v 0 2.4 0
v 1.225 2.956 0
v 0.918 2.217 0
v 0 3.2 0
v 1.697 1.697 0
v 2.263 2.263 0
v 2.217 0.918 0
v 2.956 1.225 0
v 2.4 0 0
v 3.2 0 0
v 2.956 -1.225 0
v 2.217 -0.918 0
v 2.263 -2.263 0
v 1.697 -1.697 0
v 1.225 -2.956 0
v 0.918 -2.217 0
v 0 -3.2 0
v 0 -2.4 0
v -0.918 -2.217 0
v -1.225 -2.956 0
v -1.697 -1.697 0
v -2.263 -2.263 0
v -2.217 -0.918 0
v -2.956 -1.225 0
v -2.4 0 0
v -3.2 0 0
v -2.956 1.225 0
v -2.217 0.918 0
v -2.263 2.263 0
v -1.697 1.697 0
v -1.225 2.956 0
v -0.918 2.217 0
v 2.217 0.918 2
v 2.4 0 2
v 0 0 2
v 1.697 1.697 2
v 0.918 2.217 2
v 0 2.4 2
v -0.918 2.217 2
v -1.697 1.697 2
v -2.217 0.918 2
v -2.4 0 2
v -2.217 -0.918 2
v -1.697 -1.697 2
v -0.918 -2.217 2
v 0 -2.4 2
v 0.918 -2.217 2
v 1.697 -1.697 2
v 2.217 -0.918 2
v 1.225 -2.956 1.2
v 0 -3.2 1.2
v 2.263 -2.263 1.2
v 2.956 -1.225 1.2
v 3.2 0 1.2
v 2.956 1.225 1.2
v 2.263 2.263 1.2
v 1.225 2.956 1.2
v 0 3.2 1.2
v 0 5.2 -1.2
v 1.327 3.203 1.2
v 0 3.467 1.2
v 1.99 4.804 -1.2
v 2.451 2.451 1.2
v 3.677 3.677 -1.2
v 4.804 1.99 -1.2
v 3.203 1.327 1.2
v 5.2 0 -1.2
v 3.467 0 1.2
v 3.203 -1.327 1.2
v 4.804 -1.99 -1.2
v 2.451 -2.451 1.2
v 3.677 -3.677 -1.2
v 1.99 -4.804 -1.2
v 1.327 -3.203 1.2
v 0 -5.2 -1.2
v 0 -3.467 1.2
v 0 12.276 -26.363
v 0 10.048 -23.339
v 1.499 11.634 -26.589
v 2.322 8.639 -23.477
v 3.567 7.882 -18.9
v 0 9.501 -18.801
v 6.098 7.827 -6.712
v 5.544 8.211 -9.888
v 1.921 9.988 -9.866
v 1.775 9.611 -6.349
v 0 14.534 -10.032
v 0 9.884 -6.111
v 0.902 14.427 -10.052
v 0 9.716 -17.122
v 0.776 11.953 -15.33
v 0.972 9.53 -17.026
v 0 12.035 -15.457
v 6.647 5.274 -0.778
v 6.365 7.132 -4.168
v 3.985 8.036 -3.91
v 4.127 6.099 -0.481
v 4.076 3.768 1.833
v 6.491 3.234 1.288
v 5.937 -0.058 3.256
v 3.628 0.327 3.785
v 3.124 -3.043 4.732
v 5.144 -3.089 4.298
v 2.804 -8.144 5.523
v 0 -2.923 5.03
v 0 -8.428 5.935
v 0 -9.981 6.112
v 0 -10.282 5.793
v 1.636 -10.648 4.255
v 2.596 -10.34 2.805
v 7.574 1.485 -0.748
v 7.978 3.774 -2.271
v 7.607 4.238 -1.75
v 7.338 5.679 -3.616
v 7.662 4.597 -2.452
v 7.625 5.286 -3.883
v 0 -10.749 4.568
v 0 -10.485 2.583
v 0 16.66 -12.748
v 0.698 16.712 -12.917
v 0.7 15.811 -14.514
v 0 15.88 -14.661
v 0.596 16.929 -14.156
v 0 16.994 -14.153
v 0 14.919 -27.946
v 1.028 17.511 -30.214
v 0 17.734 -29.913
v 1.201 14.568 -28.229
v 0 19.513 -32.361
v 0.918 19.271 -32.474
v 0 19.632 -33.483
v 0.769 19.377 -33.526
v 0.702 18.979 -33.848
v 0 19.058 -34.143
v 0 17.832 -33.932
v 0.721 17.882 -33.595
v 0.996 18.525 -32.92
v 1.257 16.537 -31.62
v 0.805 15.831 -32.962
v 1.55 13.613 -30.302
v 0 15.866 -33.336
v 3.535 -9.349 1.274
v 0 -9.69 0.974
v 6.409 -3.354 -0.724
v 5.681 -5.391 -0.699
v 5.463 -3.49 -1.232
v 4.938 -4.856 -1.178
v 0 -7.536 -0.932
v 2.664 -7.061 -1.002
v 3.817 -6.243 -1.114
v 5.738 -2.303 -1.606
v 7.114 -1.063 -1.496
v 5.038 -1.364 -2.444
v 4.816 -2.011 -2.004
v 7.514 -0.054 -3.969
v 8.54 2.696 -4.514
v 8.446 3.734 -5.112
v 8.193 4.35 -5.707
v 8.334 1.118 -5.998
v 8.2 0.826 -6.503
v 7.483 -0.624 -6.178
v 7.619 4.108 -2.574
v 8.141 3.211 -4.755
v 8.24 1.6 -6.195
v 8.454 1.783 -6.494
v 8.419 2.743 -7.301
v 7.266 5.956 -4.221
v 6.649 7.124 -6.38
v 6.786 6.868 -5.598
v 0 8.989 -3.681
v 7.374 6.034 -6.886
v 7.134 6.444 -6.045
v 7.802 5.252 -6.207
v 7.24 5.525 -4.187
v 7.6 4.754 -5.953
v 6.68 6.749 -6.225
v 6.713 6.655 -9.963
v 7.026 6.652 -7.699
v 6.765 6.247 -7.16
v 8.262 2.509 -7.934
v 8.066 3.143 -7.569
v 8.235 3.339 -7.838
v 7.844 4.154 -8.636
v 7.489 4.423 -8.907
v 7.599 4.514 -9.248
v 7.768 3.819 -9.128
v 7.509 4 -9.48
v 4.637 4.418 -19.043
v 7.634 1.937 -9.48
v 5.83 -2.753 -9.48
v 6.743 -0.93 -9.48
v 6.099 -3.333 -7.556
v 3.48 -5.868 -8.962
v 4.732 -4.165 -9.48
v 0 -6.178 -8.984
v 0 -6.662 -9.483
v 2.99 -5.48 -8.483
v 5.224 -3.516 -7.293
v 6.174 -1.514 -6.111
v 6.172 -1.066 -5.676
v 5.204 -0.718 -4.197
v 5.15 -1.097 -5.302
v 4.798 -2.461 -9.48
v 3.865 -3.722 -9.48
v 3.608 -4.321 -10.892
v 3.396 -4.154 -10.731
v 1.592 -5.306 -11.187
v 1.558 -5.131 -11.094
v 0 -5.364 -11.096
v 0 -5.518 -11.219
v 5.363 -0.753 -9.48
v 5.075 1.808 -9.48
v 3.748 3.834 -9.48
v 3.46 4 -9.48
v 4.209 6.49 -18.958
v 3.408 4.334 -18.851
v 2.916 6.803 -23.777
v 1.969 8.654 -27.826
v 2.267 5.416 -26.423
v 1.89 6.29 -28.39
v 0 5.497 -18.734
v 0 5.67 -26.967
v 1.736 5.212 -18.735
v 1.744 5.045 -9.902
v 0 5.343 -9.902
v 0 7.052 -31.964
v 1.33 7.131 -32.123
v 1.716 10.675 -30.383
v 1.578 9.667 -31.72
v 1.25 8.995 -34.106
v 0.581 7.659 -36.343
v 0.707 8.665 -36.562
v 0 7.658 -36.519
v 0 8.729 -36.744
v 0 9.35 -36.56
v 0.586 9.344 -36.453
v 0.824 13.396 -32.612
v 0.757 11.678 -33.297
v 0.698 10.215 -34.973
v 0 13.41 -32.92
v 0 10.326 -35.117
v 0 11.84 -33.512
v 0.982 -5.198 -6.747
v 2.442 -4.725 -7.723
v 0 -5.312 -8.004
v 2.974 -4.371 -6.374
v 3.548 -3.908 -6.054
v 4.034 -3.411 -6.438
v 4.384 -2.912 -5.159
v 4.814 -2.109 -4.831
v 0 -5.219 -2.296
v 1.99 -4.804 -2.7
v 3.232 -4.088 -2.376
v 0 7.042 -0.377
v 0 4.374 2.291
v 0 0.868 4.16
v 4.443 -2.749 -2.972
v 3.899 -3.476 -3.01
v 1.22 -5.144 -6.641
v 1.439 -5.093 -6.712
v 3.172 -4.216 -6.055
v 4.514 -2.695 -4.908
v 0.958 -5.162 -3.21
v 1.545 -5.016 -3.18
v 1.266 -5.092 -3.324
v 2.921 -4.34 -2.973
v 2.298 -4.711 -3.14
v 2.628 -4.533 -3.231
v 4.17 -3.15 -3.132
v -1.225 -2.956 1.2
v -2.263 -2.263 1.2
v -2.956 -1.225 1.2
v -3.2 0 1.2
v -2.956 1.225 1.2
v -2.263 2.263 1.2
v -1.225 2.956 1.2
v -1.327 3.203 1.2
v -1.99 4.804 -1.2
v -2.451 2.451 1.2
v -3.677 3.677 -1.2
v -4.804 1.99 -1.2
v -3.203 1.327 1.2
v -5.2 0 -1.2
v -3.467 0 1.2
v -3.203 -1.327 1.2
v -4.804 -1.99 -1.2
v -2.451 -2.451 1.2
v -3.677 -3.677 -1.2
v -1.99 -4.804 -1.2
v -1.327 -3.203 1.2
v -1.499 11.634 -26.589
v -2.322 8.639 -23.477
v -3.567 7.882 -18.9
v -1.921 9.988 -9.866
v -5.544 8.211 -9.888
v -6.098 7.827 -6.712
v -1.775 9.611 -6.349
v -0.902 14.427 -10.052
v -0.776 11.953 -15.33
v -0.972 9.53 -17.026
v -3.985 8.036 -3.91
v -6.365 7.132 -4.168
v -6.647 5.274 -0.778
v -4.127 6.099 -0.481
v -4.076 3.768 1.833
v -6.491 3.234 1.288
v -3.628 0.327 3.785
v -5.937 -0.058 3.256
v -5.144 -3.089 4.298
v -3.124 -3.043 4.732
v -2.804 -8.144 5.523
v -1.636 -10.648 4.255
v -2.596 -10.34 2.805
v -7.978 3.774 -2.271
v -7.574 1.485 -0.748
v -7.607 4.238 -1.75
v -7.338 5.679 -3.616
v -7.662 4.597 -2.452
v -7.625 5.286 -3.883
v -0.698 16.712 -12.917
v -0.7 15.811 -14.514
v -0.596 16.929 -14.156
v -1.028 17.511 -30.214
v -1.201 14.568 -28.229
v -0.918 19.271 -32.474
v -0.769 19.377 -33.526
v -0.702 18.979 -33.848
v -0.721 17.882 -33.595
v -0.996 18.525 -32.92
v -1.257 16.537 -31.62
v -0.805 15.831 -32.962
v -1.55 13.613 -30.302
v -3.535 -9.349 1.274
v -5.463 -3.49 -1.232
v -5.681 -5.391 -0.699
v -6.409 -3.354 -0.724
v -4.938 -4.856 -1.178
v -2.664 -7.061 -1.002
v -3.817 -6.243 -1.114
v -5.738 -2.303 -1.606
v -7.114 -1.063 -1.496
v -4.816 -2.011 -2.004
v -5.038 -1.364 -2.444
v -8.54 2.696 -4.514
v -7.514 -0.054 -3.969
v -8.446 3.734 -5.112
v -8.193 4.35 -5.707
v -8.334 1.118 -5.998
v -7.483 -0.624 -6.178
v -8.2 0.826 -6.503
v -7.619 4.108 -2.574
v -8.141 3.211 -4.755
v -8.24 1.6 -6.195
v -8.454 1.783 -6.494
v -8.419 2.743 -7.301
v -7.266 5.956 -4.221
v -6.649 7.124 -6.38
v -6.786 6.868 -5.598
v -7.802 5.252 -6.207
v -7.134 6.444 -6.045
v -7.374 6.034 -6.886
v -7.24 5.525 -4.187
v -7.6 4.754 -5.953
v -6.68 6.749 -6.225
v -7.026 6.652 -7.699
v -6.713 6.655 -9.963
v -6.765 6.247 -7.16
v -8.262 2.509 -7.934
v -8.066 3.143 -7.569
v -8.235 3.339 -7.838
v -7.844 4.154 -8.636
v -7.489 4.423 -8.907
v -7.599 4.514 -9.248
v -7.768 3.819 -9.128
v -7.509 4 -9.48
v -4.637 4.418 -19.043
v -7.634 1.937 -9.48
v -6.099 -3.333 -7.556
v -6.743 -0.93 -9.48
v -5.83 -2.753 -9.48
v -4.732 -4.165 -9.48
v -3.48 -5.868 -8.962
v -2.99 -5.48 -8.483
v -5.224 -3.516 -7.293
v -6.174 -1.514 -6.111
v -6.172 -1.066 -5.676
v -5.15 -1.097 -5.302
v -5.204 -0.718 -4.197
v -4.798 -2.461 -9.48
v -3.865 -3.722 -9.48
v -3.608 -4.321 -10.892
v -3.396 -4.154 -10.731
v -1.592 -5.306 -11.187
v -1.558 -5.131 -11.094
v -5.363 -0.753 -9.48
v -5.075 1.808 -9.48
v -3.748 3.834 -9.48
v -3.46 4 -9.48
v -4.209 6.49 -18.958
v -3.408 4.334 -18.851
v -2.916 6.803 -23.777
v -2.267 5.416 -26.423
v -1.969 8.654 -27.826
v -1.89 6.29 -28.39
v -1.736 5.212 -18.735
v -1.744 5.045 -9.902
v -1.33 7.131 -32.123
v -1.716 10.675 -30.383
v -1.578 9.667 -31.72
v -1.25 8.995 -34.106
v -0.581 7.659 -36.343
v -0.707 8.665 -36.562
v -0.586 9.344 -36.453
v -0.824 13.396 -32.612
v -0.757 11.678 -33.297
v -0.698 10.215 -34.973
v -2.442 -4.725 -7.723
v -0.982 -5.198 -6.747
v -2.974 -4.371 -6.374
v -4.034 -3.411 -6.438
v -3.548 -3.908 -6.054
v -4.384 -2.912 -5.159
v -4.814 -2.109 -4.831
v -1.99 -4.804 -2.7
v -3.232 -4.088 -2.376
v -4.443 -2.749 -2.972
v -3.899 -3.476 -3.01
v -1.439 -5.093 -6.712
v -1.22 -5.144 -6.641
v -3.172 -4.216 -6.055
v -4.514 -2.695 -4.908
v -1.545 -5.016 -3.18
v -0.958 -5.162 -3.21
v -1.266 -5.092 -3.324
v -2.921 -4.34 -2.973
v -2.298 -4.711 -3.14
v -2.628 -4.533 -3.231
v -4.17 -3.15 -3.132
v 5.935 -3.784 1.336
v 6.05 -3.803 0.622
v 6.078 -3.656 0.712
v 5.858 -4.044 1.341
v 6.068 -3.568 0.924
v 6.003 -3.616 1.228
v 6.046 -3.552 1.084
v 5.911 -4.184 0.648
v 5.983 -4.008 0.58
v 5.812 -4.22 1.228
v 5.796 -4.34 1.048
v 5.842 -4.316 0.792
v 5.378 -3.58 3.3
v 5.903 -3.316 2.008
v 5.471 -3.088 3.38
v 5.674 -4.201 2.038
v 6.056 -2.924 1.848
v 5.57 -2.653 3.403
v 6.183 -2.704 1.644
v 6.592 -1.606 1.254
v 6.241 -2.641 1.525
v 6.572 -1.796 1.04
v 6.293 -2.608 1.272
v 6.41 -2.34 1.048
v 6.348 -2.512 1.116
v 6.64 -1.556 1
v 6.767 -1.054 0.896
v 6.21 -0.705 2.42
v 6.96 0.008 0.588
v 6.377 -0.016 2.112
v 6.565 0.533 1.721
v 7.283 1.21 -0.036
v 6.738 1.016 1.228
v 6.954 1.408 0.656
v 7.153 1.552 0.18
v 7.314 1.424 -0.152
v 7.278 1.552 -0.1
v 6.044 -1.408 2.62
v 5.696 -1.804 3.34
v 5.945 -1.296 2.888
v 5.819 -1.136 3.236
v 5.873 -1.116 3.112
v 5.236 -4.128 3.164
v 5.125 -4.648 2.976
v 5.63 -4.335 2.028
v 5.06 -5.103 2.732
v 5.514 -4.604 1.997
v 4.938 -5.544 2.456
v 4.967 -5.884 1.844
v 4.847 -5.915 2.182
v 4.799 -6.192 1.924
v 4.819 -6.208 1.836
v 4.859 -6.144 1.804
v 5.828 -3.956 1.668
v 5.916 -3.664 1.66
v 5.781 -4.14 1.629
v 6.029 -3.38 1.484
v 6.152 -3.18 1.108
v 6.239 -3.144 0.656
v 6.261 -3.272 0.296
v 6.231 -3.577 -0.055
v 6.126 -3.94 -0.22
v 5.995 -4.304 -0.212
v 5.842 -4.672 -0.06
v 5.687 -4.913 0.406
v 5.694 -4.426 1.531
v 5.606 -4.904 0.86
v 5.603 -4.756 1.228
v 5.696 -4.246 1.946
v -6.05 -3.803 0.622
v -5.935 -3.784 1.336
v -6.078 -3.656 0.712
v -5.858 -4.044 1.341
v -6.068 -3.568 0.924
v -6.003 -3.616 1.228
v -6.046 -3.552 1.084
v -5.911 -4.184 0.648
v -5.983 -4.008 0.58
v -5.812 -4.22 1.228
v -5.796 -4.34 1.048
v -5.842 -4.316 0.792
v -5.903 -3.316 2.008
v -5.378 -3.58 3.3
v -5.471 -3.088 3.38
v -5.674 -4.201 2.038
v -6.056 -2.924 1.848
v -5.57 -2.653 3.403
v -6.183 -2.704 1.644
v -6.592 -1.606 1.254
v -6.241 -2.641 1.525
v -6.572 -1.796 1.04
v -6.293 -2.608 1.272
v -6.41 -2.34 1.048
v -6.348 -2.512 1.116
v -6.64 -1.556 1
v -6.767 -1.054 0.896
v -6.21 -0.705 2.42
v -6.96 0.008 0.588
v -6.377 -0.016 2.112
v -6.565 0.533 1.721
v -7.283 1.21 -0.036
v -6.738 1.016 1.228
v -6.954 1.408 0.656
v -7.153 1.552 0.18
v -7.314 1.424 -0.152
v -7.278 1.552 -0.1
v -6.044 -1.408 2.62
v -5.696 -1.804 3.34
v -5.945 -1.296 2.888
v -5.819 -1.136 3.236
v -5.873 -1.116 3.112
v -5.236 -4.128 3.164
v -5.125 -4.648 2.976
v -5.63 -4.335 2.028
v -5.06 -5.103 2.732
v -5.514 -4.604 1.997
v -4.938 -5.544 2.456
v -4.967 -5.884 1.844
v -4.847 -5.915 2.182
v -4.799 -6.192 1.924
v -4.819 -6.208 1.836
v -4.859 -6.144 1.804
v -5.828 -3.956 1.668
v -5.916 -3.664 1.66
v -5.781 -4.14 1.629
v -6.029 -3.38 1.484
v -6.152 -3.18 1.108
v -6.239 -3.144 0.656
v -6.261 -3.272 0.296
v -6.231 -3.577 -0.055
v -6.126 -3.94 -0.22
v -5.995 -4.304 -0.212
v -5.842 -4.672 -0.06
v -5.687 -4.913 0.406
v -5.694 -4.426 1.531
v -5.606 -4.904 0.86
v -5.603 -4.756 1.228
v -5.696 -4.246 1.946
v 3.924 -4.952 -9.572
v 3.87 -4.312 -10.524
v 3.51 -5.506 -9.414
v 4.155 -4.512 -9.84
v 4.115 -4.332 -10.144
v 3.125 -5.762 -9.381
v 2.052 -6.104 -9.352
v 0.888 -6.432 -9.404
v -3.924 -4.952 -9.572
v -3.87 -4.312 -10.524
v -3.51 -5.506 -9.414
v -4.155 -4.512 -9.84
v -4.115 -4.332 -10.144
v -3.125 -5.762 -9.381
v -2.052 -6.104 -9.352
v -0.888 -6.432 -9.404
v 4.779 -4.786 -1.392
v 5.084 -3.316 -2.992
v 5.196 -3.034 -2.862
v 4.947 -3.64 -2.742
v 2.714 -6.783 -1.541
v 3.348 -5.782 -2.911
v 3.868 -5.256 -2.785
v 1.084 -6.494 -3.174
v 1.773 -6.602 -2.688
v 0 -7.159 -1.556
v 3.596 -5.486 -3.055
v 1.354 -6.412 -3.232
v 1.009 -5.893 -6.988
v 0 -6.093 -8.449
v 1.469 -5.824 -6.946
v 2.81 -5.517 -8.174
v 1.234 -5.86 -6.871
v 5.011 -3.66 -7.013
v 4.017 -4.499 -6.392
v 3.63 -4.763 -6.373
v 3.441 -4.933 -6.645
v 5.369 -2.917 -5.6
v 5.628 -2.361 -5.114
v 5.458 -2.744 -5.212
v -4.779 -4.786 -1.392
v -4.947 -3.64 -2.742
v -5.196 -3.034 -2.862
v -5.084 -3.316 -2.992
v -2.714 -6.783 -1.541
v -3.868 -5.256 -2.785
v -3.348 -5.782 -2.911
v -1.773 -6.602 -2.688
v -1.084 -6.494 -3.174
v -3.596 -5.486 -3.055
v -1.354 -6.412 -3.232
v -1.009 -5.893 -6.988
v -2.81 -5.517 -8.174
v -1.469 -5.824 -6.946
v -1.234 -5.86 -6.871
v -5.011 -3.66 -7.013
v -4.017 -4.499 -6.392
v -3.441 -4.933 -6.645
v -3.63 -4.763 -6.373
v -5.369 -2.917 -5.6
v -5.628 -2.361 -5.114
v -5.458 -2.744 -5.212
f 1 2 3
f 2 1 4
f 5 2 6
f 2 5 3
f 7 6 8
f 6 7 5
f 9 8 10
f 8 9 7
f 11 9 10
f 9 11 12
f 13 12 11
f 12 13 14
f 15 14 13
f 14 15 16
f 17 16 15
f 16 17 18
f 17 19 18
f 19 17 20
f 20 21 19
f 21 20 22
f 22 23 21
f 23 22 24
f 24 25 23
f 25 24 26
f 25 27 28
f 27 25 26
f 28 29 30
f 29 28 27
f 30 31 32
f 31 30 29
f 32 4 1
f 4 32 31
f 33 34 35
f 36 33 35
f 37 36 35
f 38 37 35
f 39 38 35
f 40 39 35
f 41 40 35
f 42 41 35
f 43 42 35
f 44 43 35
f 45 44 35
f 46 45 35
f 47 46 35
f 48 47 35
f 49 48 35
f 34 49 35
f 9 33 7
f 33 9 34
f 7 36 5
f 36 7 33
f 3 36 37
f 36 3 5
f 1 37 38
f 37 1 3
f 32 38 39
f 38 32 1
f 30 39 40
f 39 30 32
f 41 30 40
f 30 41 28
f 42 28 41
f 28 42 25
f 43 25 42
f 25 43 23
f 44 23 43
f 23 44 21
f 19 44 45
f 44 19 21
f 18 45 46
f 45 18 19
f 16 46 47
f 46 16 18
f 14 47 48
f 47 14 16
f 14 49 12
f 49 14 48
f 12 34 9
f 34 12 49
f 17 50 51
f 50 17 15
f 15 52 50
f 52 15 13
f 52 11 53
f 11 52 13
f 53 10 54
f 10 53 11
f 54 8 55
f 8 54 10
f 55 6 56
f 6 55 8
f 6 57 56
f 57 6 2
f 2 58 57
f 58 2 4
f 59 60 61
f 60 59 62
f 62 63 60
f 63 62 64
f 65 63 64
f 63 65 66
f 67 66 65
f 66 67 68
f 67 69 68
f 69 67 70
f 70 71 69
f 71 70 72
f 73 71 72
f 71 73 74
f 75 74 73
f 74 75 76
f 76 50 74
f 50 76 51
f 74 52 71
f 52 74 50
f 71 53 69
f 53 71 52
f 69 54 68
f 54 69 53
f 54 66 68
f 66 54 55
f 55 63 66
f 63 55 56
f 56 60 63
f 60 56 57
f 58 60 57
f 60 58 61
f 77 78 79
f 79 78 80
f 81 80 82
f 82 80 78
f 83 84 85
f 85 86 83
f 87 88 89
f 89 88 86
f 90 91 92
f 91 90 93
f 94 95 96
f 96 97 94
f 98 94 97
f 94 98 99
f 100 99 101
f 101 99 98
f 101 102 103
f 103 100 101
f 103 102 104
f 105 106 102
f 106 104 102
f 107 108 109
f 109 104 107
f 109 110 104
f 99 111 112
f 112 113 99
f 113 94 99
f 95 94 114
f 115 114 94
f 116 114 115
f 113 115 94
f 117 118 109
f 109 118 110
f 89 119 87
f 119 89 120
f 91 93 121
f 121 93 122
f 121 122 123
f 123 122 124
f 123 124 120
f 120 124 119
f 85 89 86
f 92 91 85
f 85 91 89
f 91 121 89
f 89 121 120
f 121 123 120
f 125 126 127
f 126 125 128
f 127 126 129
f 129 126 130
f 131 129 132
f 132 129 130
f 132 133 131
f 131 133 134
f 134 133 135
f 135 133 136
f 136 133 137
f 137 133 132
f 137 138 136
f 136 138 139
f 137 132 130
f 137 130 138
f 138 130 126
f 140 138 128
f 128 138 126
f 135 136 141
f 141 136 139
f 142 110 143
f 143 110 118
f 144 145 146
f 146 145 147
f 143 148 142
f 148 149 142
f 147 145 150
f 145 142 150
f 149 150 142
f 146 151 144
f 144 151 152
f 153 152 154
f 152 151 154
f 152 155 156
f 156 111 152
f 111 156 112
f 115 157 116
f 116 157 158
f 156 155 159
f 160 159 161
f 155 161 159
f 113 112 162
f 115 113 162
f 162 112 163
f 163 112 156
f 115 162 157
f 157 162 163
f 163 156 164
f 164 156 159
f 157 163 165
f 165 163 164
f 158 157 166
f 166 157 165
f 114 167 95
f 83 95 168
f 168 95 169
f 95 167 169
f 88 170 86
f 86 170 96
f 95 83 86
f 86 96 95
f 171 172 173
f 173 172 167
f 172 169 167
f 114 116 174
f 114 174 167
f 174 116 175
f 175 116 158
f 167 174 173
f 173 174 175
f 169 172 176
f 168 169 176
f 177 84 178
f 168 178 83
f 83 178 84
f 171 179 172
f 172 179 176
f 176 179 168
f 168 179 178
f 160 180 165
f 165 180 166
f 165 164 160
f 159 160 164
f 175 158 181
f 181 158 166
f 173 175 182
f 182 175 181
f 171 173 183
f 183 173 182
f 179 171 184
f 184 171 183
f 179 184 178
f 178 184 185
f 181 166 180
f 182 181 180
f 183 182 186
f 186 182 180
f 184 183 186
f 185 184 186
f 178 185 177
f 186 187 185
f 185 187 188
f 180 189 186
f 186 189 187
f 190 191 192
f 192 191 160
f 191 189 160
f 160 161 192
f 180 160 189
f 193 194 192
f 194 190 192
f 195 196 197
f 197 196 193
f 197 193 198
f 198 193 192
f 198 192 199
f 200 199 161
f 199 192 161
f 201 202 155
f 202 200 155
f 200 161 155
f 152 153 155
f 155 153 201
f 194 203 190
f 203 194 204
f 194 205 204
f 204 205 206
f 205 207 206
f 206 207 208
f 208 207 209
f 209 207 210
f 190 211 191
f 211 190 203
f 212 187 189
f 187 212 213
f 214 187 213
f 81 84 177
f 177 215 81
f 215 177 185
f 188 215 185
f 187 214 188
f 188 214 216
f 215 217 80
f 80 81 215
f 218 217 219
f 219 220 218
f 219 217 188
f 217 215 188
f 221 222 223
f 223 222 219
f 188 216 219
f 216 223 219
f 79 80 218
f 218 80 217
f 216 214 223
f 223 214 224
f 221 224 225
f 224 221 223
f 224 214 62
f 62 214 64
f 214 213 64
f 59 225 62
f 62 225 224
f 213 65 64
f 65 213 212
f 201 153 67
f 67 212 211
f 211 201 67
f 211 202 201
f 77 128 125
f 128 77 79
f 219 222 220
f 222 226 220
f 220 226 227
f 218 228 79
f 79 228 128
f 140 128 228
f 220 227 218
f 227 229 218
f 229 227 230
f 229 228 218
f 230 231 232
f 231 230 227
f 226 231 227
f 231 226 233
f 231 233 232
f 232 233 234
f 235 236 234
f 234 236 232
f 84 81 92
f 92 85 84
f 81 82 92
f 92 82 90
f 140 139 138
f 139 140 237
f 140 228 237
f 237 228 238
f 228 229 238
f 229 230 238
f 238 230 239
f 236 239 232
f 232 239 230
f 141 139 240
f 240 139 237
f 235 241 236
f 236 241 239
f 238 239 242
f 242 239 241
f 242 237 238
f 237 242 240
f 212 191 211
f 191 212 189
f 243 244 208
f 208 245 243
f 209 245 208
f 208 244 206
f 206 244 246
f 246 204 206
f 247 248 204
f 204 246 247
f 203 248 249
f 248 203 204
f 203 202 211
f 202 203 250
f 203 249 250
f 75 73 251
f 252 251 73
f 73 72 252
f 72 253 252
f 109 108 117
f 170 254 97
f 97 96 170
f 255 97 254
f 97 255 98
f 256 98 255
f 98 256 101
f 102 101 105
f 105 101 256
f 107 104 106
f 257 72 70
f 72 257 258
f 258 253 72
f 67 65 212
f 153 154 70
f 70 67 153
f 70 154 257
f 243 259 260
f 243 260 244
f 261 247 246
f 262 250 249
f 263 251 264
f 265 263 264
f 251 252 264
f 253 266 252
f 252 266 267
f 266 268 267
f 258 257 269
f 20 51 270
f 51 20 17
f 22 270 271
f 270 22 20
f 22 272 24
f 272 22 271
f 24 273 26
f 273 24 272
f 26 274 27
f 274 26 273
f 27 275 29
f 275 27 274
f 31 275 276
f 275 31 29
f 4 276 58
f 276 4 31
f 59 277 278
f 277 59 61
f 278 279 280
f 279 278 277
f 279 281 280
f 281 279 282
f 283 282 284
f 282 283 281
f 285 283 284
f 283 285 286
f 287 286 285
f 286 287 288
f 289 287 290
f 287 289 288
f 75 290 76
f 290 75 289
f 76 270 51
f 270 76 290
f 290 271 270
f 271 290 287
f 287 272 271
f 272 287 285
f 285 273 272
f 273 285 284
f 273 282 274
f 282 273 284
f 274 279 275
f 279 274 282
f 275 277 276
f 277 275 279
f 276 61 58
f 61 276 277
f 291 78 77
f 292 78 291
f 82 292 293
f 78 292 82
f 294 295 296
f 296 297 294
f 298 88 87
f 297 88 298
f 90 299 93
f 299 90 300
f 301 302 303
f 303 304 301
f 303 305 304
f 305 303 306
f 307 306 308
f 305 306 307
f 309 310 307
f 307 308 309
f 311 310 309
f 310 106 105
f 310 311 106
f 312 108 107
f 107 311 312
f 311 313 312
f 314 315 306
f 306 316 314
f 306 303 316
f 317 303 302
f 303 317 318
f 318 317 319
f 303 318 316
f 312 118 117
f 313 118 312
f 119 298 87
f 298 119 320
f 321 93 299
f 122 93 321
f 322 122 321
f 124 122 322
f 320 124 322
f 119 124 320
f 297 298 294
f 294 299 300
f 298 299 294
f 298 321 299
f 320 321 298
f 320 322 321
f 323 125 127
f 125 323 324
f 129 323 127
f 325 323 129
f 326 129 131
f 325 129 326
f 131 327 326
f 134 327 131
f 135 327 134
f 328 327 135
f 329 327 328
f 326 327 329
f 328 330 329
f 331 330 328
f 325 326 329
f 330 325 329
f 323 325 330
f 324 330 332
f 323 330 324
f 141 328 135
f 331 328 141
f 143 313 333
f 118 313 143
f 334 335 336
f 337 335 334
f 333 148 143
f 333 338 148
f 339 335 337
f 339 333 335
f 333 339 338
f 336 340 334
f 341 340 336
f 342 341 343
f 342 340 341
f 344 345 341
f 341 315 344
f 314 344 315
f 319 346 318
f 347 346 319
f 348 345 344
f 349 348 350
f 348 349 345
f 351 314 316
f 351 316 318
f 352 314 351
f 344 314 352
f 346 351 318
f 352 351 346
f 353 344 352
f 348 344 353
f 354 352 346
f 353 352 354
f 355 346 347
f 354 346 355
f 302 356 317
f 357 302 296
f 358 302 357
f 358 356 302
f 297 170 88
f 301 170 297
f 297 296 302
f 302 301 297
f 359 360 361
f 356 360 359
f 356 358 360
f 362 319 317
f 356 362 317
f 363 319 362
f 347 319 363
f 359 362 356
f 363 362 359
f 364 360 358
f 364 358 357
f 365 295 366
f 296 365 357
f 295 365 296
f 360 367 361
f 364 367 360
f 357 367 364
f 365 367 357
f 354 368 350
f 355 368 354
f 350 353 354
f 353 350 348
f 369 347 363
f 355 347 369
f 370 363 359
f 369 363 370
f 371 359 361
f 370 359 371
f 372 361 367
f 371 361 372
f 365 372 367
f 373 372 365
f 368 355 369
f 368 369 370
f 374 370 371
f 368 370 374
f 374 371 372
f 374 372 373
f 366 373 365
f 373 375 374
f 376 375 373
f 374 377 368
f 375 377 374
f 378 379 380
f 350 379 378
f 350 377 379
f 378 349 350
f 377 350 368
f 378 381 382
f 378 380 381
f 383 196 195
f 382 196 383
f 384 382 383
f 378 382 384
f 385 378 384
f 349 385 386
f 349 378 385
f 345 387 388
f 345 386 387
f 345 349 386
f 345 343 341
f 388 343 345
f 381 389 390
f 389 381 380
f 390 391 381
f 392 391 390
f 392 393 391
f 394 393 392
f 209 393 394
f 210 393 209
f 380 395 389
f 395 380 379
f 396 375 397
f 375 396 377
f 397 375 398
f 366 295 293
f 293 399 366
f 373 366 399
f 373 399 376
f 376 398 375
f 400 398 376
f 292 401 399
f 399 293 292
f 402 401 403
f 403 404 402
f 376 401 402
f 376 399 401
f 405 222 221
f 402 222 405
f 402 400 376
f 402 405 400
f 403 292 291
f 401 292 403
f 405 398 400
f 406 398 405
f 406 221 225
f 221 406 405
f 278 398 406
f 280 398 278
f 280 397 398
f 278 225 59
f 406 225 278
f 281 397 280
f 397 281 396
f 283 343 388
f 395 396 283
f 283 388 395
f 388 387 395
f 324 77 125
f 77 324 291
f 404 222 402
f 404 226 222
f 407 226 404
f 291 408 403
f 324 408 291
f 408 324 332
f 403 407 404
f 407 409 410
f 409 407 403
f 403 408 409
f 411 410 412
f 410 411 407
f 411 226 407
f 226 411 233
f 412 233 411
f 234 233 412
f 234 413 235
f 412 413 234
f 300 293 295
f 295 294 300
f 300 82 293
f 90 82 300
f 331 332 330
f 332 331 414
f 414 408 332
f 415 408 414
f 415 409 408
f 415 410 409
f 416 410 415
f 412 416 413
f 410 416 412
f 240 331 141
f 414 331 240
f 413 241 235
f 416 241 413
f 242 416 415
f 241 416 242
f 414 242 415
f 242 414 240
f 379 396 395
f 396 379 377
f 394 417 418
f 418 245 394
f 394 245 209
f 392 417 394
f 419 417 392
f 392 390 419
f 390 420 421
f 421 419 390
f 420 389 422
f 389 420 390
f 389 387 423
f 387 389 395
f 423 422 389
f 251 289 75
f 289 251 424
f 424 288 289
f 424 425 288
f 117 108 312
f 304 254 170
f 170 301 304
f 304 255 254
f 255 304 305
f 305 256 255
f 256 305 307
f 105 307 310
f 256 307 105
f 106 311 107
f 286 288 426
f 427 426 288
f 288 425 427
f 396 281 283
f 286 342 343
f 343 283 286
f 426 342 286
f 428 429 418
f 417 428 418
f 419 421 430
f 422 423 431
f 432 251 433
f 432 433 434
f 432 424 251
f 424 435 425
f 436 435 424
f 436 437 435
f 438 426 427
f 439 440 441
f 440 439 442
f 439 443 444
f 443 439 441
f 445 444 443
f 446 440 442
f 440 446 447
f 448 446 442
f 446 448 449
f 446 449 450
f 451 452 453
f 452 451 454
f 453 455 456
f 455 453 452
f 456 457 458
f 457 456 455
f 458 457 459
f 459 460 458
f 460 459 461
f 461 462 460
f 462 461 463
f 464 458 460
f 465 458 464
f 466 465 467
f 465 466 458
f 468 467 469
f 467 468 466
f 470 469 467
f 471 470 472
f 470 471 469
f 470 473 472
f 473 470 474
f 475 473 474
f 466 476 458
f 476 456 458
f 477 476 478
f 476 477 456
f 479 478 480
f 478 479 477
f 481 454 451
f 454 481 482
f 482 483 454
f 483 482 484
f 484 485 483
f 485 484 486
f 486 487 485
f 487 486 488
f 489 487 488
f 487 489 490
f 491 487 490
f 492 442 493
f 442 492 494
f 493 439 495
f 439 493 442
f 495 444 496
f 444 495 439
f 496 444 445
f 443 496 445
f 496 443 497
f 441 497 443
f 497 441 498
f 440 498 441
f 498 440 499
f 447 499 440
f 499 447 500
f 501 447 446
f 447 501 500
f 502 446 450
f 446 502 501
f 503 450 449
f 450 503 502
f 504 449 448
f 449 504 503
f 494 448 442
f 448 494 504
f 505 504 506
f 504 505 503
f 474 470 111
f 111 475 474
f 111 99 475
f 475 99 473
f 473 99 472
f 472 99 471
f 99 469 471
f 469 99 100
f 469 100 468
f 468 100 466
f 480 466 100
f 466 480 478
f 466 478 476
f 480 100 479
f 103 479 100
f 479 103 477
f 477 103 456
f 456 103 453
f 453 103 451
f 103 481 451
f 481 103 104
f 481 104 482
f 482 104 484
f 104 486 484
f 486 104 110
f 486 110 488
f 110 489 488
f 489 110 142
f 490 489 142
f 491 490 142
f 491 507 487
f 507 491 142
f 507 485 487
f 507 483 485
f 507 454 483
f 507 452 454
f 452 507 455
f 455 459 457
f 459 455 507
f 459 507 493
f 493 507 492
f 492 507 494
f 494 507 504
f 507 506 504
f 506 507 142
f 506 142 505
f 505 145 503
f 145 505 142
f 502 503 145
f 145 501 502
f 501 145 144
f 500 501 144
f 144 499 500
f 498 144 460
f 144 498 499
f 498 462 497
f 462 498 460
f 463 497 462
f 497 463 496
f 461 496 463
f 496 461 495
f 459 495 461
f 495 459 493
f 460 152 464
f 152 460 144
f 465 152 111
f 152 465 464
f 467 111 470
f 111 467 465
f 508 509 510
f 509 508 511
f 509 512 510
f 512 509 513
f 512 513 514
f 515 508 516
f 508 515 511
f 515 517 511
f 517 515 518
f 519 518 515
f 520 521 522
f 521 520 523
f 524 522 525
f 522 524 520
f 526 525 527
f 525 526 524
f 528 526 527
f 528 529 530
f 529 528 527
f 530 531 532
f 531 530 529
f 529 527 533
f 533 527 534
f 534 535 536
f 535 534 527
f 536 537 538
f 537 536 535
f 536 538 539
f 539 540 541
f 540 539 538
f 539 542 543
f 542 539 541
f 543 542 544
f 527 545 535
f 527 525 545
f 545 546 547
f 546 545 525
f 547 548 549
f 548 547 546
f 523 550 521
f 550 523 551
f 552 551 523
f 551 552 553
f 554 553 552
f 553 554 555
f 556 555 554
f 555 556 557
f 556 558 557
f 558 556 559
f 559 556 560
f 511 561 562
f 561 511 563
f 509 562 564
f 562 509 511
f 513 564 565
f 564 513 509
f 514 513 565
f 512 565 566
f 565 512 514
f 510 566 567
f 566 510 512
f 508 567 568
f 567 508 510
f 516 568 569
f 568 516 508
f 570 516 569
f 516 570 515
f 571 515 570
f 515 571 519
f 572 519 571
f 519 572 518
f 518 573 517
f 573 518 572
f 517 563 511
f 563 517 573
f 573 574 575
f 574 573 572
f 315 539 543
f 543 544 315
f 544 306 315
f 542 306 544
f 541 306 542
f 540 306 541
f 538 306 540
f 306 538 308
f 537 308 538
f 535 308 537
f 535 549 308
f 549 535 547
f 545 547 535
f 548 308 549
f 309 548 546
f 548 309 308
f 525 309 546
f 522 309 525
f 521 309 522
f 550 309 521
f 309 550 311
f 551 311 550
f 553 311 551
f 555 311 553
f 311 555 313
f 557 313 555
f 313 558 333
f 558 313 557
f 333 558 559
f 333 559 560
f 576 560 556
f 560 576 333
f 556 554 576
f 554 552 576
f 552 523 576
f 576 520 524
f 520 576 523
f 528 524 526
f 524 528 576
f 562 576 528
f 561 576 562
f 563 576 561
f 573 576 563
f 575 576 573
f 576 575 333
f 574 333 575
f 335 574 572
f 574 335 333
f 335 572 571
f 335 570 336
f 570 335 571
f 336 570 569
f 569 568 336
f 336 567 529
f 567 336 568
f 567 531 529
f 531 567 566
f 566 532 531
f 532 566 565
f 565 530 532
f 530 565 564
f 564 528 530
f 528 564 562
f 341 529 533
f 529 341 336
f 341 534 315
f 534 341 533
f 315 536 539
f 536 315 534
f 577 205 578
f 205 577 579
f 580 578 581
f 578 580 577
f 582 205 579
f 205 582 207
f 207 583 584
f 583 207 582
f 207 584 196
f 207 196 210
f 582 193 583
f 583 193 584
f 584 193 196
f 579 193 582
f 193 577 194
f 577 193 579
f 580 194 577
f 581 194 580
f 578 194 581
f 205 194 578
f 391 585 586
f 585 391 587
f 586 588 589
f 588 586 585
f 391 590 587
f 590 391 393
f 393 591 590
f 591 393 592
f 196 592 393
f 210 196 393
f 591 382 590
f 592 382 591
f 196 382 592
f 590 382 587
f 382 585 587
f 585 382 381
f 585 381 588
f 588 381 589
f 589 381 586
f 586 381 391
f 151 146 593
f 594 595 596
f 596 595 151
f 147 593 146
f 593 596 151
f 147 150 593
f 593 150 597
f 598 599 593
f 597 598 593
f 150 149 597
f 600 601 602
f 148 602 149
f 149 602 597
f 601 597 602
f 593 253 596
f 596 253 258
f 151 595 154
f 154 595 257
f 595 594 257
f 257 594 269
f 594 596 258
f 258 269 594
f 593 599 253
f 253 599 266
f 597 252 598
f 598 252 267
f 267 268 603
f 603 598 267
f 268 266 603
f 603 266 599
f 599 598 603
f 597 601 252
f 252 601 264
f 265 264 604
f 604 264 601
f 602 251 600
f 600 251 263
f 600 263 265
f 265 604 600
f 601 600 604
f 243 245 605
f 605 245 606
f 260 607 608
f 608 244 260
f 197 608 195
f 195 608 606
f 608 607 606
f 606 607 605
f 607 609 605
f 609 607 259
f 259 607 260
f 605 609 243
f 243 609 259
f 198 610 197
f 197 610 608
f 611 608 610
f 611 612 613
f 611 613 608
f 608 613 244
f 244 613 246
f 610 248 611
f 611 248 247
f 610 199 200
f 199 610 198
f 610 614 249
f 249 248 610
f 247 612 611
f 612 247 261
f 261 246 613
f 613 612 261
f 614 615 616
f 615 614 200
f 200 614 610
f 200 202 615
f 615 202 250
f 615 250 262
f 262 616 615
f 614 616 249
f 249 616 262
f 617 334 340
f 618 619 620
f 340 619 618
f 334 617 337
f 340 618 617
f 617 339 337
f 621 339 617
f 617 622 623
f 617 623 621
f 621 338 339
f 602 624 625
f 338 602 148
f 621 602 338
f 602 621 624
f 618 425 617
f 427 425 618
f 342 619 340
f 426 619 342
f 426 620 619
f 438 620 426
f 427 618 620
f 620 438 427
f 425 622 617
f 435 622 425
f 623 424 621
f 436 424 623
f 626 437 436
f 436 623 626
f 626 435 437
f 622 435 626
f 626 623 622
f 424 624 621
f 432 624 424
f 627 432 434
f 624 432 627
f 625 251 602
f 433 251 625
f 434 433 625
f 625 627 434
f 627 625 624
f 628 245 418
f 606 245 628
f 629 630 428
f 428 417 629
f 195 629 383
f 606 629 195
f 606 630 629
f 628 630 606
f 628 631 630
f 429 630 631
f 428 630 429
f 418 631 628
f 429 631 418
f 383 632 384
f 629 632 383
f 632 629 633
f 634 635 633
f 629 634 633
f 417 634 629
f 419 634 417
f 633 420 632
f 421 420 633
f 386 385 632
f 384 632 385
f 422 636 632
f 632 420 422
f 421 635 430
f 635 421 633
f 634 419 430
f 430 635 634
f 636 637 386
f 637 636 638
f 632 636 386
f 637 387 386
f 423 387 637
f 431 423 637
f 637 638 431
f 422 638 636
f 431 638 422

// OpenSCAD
use <../lib.scad>
use <s/24076p02s01.scad>
use <s/24076p02s02.scad>
use <s/24076s01.scad>
use <s/24076s04.scad>
use <../p/stud4o.scad>
function ldraw_lib__24076p02() = [
// 0 Minifig Headdress Shark with Tail and Fin with Red Eye and White Orca Marks and Teeth Pattern
// 0 Name: 24076p02.dat
// 0 Author: Philippe Hurbain [Philo]
// 0 !LDRAW_ORG Part UPDATE 2020-02
// 0 !LICENSE Licensed under CC BY 4.0 : see CAreadme.txt
// 
// 0 BFC CERTIFY CCW
  [0,"BFC","CERTIFY"],
  [0,"BFC","CCW"],
// 
// 0 !CATEGORY Minifig Headwear
// 0 !KEYWORDS Suit
// 
// 0 !HISTORY 2016-03-18 {LEGO Digital Designer} Original part shape
// 0 !HISTORY 2019-05-20 [Philo] File preparation for LDraw Parts Tracker
// 0 !HISTORY 2020-06-28 [PTadmin] Official Update 2020-01
// 0 !HISTORY 2020-07-23 [cwdee] Update description
// 0 !HISTORY 2020-09-05 [PTadmin] Official Update 2020-02
// 
// 
// 1 16 0 -5 0 -1 0 0 0 -1.25 0 0 0 1 stud4o.dat
  [1,16,0,-5,0,-1,0,0,0,-1.25,0,0,0,1, ldraw_lib__stud4o()],
// 1 16 0 0 0 1 0 0 0 1 0 0 0 1 s\24076s01.dat
  [1,16,0,0,0,1,0,0,0,1,0,0,0,1, ldraw_lib__s__24076s01()],
// 1 16 0 0 0 -1 0 0 0 1 0 0 0 1 s\24076s01.dat
  [1,16,0,0,0,-1,0,0,0,1,0,0,0,1, ldraw_lib__s__24076s01()],
// 1 16 0 0 0 1 0 0 0 1 0 0 0 1 s\24076p02s01.dat
  [1,16,0,0,0,1,0,0,0,1,0,0,0,1, ldraw_lib__s__24076p02s01()],
// 1 16 0 0 0 -1 0 0 0 1 0 0 0 1 s\24076p02s01.dat
  [1,16,0,0,0,-1,0,0,0,1,0,0,0,1, ldraw_lib__s__24076p02s01()],
// 1 16 0 0 0 1 0 0 0 1 0 0 0 1 s\24076p02s02.dat
  [1,16,0,0,0,1,0,0,0,1,0,0,0,1, ldraw_lib__s__24076p02s02()],
// 1 16 0 0 0 -1 0 0 0 1 0 0 0 1 s\24076p02s02.dat
  [1,16,0,0,0,-1,0,0,0,1,0,0,0,1, ldraw_lib__s__24076p02s02()],
// 1 15 0 0 0 1 0 0 0 1 0 0 0 1 s\24076s04.dat
  [1,15,0,0,0,1,0,0,0,1,0,0,0,1, ldraw_lib__s__24076s04()],
// 1 15 0 0 0 -1 0 0 0 1 0 0 0 1 s\24076s04.dat
  [1,15,0,0,0,-1,0,0,0,1,0,0,0,1, ldraw_lib__s__24076s04()],
];
module ldraw_lib__24076p02(step=0, col=false, unit=2/5, alt=false, line=0.2, solid=!$preview)
    makepoly(ldraw_lib__24076p02(), step=step, col=col, unit=unit, alt=alt, line=line, solid=solid);
ldraw_lib__24076p02(line=0.2);
